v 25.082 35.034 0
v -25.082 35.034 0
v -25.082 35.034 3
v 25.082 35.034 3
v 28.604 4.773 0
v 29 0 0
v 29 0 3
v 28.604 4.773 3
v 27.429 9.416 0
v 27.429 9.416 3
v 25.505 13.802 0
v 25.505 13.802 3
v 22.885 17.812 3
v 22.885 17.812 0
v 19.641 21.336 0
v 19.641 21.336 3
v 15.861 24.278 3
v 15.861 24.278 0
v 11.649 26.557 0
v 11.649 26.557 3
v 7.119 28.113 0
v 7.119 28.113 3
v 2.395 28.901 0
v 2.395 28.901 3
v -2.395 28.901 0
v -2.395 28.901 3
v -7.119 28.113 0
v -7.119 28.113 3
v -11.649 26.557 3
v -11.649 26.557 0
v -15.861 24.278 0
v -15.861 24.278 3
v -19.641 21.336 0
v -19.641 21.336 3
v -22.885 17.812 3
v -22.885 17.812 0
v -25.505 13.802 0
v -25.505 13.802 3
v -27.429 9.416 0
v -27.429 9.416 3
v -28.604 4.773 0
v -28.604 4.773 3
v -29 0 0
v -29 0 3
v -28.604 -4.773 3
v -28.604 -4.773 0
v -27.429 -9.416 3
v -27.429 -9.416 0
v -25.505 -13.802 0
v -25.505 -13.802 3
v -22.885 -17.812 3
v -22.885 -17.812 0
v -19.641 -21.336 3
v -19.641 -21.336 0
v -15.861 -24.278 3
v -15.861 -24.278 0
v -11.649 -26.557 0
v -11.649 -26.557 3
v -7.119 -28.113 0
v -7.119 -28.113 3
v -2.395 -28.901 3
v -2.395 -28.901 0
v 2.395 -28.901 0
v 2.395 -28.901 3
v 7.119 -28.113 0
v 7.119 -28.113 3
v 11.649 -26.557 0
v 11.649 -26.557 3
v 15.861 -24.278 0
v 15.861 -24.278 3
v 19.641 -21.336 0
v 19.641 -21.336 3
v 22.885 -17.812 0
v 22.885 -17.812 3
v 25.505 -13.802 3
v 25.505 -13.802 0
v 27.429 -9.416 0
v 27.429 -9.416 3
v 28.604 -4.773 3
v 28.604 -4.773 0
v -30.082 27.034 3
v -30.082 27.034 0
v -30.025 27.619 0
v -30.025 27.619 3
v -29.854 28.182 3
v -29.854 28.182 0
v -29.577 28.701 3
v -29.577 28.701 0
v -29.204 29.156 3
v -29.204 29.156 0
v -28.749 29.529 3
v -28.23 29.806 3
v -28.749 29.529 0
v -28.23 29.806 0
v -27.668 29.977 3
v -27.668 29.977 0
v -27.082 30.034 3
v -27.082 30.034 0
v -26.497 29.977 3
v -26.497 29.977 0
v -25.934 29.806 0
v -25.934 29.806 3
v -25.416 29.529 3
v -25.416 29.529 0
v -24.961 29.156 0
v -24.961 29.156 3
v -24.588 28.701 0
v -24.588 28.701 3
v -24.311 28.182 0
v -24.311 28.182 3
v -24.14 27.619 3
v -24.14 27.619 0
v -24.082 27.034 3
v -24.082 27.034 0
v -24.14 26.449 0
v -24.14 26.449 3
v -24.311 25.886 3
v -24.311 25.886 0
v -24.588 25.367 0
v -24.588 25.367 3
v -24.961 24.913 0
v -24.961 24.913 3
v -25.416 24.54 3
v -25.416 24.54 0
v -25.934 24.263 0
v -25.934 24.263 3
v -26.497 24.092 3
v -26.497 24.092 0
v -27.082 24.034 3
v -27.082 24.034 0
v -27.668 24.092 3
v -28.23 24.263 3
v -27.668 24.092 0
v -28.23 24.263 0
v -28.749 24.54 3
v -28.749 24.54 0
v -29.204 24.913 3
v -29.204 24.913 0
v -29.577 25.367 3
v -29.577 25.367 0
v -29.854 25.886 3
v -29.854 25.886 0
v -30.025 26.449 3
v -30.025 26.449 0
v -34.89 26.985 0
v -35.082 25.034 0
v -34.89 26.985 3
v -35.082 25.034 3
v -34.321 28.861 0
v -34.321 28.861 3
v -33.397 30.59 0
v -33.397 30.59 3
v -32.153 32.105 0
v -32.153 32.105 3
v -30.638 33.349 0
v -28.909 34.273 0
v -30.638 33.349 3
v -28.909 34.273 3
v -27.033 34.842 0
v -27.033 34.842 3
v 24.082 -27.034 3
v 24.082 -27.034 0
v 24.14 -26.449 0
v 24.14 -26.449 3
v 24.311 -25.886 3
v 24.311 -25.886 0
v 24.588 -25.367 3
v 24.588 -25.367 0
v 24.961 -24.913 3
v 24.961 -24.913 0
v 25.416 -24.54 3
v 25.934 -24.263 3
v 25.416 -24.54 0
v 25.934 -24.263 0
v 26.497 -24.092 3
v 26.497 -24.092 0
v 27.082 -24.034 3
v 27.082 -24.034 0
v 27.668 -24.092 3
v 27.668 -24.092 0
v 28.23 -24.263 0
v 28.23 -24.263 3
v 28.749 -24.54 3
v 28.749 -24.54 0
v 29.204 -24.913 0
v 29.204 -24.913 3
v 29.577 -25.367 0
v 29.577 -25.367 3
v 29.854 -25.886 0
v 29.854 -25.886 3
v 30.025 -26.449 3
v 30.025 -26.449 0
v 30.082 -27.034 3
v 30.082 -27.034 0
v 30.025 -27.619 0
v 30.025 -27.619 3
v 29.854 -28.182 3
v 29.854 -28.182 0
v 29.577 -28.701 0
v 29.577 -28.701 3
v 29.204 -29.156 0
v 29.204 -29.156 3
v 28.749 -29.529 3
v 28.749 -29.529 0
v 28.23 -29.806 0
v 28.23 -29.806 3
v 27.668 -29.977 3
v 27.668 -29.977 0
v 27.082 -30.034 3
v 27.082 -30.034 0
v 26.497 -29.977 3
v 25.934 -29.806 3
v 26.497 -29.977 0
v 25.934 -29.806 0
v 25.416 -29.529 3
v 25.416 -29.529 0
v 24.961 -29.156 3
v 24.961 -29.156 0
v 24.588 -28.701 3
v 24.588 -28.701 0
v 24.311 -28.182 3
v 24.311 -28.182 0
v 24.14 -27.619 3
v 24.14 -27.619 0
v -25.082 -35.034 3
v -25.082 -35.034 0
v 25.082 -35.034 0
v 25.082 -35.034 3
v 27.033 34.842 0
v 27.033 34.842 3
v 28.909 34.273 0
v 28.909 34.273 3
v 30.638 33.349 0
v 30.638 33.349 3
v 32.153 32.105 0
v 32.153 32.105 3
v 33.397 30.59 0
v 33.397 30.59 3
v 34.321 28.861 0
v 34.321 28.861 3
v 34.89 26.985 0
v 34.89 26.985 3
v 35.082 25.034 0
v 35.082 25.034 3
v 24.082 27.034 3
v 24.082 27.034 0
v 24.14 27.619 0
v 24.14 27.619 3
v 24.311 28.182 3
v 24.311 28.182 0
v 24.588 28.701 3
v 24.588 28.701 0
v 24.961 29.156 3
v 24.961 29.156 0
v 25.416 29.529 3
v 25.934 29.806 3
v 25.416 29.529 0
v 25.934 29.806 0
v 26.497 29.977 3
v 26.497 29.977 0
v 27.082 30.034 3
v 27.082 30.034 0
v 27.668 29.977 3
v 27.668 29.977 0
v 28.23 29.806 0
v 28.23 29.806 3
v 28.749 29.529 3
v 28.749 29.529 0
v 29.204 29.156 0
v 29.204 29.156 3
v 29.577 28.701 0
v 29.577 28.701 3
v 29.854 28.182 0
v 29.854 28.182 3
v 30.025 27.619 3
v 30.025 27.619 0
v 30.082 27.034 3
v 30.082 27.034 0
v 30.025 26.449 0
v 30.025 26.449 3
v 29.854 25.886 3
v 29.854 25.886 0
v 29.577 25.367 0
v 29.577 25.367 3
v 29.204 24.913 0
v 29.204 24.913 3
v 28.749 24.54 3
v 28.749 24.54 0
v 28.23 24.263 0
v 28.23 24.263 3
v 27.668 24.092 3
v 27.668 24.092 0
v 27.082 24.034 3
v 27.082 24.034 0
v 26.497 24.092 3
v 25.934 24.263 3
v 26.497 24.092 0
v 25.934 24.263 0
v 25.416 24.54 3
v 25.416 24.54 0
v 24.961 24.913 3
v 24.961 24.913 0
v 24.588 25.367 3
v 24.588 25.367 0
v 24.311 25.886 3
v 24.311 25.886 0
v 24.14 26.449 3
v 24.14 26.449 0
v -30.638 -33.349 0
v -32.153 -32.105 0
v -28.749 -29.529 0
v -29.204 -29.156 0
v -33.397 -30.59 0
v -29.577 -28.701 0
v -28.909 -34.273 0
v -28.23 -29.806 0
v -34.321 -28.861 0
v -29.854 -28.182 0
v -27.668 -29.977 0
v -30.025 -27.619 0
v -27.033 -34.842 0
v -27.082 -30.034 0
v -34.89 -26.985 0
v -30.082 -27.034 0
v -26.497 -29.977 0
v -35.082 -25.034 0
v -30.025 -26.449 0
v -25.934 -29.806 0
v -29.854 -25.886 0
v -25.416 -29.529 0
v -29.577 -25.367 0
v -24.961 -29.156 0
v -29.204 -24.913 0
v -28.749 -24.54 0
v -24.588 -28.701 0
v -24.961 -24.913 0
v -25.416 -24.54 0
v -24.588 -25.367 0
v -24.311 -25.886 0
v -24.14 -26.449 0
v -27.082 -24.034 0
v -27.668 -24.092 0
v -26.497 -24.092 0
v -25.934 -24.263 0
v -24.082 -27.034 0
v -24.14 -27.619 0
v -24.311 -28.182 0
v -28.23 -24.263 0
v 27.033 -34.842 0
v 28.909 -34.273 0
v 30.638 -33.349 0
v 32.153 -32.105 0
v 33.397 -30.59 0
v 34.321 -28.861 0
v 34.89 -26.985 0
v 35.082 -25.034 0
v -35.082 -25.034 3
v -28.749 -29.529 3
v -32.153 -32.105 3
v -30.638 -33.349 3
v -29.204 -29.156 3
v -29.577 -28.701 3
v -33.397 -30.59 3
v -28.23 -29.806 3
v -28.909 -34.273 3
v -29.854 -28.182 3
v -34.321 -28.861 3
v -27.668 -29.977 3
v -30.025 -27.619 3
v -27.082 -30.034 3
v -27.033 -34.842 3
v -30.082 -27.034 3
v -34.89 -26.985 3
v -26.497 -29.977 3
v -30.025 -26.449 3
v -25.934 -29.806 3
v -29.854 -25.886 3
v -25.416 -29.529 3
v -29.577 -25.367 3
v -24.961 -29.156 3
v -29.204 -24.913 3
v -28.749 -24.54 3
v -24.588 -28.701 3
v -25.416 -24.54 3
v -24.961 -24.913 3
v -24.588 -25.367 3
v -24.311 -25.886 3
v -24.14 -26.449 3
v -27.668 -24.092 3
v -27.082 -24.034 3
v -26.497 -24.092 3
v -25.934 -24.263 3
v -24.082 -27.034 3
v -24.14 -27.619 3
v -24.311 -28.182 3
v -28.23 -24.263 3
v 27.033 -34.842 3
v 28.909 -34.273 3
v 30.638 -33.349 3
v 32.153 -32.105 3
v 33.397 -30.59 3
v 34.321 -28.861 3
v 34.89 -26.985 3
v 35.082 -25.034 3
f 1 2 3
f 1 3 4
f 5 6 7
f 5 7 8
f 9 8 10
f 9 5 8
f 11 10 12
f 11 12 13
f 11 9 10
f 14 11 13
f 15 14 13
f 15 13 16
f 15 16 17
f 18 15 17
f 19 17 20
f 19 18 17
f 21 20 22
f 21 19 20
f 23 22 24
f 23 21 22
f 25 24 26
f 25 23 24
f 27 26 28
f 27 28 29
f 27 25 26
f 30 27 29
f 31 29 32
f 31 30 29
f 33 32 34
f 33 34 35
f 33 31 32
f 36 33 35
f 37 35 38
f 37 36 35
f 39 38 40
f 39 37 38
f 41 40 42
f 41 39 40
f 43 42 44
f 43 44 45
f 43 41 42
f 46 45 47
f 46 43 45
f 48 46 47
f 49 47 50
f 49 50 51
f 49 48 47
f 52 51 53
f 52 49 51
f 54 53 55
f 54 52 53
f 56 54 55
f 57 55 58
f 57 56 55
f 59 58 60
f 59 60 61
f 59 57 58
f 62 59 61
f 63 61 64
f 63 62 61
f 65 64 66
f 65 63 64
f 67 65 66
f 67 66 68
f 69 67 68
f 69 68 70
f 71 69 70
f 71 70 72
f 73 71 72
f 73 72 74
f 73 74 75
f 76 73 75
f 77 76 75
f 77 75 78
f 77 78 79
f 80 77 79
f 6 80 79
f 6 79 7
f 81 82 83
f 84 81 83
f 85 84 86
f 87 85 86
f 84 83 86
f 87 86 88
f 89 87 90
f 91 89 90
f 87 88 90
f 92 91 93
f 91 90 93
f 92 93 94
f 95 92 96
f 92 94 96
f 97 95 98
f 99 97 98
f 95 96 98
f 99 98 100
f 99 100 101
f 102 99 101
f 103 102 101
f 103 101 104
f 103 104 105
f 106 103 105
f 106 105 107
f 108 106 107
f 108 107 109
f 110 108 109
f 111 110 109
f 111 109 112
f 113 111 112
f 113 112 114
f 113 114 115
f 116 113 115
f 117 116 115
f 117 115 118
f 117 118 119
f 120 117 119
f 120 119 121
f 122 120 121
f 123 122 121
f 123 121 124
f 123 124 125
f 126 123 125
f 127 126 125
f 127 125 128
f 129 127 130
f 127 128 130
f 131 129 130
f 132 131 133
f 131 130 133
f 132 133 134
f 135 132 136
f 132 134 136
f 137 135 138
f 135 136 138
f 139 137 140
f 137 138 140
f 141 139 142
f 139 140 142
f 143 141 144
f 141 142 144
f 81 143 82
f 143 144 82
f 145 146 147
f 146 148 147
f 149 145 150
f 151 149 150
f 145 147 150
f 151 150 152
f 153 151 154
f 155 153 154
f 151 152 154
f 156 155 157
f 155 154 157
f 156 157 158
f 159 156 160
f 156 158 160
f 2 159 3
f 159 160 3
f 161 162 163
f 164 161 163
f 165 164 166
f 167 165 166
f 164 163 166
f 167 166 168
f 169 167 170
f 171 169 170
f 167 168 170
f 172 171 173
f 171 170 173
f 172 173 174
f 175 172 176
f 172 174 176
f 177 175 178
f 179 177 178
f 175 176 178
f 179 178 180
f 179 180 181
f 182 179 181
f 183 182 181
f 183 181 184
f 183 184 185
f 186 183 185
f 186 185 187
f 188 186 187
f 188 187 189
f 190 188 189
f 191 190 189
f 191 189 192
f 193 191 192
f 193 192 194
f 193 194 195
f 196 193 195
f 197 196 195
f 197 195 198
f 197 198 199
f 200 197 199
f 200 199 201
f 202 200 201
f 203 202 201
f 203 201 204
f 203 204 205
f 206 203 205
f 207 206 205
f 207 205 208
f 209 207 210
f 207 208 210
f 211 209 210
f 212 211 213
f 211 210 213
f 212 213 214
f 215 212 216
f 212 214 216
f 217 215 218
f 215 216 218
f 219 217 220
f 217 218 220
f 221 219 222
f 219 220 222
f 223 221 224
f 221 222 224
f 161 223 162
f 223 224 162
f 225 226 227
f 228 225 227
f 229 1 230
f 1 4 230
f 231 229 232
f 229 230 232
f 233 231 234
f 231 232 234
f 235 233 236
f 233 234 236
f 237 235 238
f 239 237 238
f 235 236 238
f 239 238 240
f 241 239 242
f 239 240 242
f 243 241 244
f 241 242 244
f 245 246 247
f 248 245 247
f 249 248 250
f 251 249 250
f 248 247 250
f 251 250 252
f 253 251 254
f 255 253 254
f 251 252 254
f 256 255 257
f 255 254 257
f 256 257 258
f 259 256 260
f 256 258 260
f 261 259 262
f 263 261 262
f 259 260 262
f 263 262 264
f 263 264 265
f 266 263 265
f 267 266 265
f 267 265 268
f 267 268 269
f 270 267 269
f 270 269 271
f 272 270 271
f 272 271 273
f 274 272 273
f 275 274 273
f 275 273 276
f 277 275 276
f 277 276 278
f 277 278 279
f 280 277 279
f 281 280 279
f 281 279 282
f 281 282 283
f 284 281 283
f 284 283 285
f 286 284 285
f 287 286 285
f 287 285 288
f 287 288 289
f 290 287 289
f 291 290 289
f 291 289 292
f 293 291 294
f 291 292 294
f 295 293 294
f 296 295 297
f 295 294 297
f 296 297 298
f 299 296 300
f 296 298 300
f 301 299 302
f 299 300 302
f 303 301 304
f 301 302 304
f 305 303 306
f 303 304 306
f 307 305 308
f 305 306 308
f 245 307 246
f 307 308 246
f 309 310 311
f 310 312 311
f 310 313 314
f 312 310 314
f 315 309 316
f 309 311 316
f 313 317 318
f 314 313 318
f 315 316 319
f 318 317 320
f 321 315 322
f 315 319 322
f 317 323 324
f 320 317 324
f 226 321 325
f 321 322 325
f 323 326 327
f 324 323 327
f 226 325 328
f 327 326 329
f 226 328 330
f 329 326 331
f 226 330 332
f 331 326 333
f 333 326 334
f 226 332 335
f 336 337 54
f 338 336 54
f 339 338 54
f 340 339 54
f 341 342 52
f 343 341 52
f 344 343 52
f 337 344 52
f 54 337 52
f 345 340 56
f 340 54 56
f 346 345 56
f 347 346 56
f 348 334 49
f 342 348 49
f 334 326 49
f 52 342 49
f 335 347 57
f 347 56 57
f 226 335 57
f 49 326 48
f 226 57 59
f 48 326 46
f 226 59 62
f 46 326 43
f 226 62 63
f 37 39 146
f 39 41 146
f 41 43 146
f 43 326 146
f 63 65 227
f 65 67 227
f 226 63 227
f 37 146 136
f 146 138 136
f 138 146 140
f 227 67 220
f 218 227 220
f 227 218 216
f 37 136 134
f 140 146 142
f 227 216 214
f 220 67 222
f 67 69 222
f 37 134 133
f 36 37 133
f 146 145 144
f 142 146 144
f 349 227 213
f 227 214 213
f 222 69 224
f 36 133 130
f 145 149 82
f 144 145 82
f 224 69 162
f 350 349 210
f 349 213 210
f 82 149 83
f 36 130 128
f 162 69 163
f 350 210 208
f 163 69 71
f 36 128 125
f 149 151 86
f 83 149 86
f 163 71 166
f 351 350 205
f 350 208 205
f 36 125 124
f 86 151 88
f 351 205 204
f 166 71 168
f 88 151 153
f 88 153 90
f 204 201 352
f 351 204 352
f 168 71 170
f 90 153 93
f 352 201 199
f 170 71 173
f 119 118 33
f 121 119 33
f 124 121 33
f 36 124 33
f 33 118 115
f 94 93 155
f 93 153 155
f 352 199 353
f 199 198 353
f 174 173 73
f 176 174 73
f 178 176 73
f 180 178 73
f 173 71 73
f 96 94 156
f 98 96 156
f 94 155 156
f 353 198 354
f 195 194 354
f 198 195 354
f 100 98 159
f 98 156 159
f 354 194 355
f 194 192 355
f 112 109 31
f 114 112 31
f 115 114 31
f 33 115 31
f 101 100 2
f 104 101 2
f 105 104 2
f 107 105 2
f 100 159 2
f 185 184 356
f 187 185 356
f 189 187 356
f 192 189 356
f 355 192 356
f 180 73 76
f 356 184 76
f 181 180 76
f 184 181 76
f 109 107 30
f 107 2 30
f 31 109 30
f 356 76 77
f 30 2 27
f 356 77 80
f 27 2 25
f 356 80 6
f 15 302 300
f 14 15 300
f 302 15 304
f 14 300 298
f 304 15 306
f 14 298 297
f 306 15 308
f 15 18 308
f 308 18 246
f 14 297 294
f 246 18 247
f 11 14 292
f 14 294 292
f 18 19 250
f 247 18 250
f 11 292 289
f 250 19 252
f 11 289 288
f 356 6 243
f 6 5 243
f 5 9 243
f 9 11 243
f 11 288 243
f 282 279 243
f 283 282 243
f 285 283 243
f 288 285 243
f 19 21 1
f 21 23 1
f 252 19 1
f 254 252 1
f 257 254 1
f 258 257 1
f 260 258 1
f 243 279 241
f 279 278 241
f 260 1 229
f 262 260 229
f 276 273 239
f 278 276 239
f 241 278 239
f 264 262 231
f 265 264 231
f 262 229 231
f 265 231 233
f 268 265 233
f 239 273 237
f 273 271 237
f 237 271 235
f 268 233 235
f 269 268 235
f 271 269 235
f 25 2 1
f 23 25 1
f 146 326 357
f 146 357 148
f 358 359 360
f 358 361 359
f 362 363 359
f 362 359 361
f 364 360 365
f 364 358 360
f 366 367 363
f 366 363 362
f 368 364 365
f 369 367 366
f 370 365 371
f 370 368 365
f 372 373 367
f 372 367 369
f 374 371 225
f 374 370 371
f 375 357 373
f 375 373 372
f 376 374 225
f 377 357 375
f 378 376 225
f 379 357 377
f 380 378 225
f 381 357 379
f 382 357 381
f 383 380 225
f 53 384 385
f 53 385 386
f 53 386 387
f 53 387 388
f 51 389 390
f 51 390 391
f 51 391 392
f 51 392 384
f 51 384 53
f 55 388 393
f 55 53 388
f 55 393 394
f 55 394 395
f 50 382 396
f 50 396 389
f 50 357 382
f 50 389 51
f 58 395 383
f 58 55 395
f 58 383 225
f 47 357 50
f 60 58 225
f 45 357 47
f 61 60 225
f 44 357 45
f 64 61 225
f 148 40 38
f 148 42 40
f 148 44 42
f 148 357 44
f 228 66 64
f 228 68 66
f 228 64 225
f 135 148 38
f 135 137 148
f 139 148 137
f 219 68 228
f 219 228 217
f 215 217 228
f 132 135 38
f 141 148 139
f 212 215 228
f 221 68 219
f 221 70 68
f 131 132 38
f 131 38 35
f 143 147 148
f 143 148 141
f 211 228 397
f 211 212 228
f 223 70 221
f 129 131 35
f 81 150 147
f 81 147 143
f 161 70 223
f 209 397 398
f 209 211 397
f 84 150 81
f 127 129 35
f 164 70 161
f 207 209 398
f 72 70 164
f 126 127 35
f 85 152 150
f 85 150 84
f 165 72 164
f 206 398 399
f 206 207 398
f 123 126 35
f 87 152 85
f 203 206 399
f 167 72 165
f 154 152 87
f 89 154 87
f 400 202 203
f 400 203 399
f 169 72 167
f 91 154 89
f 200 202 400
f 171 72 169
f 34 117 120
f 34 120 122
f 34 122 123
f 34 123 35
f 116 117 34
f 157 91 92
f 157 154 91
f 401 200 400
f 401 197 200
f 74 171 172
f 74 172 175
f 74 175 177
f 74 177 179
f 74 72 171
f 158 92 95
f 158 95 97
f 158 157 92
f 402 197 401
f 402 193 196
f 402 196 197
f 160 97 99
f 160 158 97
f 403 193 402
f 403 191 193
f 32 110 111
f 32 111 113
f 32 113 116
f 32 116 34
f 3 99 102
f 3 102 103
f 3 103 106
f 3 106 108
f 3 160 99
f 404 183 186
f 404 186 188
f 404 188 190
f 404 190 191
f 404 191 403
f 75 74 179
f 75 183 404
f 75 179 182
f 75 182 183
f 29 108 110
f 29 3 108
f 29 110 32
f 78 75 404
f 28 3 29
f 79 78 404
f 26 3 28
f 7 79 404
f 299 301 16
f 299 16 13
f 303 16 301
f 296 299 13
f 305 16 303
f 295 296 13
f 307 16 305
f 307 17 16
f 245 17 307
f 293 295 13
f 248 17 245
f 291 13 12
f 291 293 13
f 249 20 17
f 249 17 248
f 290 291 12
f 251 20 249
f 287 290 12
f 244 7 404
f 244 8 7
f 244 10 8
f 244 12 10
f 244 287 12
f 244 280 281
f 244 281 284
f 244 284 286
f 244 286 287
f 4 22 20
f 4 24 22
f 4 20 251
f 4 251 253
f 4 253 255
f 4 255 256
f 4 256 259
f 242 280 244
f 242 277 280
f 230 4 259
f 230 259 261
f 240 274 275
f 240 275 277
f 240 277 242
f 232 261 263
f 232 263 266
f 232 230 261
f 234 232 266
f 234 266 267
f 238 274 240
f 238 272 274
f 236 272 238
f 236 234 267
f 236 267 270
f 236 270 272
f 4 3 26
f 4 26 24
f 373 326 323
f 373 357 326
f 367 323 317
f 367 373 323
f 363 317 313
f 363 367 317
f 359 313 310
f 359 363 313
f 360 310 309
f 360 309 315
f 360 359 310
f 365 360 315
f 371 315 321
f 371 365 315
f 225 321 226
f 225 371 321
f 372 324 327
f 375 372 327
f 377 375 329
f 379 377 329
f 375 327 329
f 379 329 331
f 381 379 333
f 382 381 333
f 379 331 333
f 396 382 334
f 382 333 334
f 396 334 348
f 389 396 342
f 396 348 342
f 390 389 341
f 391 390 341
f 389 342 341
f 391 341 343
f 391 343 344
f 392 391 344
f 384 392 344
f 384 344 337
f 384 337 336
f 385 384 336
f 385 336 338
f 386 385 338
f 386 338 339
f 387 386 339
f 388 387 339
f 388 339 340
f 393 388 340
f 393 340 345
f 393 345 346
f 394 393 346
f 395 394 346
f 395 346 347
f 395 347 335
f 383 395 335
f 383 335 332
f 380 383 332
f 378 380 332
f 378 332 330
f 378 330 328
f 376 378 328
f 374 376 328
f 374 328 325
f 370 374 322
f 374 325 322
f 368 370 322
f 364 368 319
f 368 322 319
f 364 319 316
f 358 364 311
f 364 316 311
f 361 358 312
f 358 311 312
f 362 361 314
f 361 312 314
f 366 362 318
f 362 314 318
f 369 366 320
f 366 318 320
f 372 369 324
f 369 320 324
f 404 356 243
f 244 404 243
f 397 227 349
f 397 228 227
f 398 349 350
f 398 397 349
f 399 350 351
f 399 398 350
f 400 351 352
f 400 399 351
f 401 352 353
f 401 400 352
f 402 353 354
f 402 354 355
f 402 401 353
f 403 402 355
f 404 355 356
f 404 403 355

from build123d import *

# Parameters (mm, degrees)
CROQUIS1_W              = 70.164619522
CROQUIS1_H              = 70.068399122
CROQUIS1_R              = 35
CROQUIS1_R_2            = 29
SALIENTE_EXTRUIR1_DEPTH = 3
REDONDEO1_R             = 10
CROQUIS2_R              = 3
CORTAR_EXTRUIR1_DEPTH   = 10


with BuildPart() as part:
    # Croquis1 → Saliente-Extruir1 (new body)
    # profile 1 of 2: a face of its own
    with BuildSketch(Plane.XY):
        Rectangle(CROQUIS1_W, CROQUIS1_H)
        Circle(CROQUIS1_R, mode=Mode.SUBTRACT)
    # profile 2 of 2: a face of its own
    with BuildSketch(Plane.XY):
        Circle(CROQUIS1_R)
        Circle(CROQUIS1_R_2, mode=Mode.SUBTRACT)
    extrude(amount=SALIENTE_EXTRUIR1_DEPTH)

    # Redondeo1
    redondeo1_edges = [part.edges().sort_by_distance(p)[0] for p in [
        (35.082309761, -35.034199561, 1.5),
        (-35.082309761, -35.034199561, 1.5),
        (-35.082309761, 35.034199561, 1.5),
        (35.082309761, 35.034199561, 1.5),
    ]]
    fillet(redondeo1_edges, radius=REDONDEO1_R)

    # Croquis2 → Cortar-Extruir1 (cut)
    with BuildSketch(Plane(origin=(0, 0, 0), x_dir=(-1, 0, 0), z_dir=(0, 0, -1))):
        with Locations((-27.082309761, 27.034199561)):
            Circle(CROQUIS2_R)
        with Locations((27.082309761, 27.034199561)):
            Circle(CROQUIS2_R)
        with Locations((-27.082309761, -27.034199561)):
            Circle(CROQUIS2_R)
        with Locations((27.082309761, -27.034199561)):
            Circle(CROQUIS2_R)
    extrude(amount=-CORTAR_EXTRUIR1_DEPTH, mode=Mode.SUBTRACT)


solid = part.part
